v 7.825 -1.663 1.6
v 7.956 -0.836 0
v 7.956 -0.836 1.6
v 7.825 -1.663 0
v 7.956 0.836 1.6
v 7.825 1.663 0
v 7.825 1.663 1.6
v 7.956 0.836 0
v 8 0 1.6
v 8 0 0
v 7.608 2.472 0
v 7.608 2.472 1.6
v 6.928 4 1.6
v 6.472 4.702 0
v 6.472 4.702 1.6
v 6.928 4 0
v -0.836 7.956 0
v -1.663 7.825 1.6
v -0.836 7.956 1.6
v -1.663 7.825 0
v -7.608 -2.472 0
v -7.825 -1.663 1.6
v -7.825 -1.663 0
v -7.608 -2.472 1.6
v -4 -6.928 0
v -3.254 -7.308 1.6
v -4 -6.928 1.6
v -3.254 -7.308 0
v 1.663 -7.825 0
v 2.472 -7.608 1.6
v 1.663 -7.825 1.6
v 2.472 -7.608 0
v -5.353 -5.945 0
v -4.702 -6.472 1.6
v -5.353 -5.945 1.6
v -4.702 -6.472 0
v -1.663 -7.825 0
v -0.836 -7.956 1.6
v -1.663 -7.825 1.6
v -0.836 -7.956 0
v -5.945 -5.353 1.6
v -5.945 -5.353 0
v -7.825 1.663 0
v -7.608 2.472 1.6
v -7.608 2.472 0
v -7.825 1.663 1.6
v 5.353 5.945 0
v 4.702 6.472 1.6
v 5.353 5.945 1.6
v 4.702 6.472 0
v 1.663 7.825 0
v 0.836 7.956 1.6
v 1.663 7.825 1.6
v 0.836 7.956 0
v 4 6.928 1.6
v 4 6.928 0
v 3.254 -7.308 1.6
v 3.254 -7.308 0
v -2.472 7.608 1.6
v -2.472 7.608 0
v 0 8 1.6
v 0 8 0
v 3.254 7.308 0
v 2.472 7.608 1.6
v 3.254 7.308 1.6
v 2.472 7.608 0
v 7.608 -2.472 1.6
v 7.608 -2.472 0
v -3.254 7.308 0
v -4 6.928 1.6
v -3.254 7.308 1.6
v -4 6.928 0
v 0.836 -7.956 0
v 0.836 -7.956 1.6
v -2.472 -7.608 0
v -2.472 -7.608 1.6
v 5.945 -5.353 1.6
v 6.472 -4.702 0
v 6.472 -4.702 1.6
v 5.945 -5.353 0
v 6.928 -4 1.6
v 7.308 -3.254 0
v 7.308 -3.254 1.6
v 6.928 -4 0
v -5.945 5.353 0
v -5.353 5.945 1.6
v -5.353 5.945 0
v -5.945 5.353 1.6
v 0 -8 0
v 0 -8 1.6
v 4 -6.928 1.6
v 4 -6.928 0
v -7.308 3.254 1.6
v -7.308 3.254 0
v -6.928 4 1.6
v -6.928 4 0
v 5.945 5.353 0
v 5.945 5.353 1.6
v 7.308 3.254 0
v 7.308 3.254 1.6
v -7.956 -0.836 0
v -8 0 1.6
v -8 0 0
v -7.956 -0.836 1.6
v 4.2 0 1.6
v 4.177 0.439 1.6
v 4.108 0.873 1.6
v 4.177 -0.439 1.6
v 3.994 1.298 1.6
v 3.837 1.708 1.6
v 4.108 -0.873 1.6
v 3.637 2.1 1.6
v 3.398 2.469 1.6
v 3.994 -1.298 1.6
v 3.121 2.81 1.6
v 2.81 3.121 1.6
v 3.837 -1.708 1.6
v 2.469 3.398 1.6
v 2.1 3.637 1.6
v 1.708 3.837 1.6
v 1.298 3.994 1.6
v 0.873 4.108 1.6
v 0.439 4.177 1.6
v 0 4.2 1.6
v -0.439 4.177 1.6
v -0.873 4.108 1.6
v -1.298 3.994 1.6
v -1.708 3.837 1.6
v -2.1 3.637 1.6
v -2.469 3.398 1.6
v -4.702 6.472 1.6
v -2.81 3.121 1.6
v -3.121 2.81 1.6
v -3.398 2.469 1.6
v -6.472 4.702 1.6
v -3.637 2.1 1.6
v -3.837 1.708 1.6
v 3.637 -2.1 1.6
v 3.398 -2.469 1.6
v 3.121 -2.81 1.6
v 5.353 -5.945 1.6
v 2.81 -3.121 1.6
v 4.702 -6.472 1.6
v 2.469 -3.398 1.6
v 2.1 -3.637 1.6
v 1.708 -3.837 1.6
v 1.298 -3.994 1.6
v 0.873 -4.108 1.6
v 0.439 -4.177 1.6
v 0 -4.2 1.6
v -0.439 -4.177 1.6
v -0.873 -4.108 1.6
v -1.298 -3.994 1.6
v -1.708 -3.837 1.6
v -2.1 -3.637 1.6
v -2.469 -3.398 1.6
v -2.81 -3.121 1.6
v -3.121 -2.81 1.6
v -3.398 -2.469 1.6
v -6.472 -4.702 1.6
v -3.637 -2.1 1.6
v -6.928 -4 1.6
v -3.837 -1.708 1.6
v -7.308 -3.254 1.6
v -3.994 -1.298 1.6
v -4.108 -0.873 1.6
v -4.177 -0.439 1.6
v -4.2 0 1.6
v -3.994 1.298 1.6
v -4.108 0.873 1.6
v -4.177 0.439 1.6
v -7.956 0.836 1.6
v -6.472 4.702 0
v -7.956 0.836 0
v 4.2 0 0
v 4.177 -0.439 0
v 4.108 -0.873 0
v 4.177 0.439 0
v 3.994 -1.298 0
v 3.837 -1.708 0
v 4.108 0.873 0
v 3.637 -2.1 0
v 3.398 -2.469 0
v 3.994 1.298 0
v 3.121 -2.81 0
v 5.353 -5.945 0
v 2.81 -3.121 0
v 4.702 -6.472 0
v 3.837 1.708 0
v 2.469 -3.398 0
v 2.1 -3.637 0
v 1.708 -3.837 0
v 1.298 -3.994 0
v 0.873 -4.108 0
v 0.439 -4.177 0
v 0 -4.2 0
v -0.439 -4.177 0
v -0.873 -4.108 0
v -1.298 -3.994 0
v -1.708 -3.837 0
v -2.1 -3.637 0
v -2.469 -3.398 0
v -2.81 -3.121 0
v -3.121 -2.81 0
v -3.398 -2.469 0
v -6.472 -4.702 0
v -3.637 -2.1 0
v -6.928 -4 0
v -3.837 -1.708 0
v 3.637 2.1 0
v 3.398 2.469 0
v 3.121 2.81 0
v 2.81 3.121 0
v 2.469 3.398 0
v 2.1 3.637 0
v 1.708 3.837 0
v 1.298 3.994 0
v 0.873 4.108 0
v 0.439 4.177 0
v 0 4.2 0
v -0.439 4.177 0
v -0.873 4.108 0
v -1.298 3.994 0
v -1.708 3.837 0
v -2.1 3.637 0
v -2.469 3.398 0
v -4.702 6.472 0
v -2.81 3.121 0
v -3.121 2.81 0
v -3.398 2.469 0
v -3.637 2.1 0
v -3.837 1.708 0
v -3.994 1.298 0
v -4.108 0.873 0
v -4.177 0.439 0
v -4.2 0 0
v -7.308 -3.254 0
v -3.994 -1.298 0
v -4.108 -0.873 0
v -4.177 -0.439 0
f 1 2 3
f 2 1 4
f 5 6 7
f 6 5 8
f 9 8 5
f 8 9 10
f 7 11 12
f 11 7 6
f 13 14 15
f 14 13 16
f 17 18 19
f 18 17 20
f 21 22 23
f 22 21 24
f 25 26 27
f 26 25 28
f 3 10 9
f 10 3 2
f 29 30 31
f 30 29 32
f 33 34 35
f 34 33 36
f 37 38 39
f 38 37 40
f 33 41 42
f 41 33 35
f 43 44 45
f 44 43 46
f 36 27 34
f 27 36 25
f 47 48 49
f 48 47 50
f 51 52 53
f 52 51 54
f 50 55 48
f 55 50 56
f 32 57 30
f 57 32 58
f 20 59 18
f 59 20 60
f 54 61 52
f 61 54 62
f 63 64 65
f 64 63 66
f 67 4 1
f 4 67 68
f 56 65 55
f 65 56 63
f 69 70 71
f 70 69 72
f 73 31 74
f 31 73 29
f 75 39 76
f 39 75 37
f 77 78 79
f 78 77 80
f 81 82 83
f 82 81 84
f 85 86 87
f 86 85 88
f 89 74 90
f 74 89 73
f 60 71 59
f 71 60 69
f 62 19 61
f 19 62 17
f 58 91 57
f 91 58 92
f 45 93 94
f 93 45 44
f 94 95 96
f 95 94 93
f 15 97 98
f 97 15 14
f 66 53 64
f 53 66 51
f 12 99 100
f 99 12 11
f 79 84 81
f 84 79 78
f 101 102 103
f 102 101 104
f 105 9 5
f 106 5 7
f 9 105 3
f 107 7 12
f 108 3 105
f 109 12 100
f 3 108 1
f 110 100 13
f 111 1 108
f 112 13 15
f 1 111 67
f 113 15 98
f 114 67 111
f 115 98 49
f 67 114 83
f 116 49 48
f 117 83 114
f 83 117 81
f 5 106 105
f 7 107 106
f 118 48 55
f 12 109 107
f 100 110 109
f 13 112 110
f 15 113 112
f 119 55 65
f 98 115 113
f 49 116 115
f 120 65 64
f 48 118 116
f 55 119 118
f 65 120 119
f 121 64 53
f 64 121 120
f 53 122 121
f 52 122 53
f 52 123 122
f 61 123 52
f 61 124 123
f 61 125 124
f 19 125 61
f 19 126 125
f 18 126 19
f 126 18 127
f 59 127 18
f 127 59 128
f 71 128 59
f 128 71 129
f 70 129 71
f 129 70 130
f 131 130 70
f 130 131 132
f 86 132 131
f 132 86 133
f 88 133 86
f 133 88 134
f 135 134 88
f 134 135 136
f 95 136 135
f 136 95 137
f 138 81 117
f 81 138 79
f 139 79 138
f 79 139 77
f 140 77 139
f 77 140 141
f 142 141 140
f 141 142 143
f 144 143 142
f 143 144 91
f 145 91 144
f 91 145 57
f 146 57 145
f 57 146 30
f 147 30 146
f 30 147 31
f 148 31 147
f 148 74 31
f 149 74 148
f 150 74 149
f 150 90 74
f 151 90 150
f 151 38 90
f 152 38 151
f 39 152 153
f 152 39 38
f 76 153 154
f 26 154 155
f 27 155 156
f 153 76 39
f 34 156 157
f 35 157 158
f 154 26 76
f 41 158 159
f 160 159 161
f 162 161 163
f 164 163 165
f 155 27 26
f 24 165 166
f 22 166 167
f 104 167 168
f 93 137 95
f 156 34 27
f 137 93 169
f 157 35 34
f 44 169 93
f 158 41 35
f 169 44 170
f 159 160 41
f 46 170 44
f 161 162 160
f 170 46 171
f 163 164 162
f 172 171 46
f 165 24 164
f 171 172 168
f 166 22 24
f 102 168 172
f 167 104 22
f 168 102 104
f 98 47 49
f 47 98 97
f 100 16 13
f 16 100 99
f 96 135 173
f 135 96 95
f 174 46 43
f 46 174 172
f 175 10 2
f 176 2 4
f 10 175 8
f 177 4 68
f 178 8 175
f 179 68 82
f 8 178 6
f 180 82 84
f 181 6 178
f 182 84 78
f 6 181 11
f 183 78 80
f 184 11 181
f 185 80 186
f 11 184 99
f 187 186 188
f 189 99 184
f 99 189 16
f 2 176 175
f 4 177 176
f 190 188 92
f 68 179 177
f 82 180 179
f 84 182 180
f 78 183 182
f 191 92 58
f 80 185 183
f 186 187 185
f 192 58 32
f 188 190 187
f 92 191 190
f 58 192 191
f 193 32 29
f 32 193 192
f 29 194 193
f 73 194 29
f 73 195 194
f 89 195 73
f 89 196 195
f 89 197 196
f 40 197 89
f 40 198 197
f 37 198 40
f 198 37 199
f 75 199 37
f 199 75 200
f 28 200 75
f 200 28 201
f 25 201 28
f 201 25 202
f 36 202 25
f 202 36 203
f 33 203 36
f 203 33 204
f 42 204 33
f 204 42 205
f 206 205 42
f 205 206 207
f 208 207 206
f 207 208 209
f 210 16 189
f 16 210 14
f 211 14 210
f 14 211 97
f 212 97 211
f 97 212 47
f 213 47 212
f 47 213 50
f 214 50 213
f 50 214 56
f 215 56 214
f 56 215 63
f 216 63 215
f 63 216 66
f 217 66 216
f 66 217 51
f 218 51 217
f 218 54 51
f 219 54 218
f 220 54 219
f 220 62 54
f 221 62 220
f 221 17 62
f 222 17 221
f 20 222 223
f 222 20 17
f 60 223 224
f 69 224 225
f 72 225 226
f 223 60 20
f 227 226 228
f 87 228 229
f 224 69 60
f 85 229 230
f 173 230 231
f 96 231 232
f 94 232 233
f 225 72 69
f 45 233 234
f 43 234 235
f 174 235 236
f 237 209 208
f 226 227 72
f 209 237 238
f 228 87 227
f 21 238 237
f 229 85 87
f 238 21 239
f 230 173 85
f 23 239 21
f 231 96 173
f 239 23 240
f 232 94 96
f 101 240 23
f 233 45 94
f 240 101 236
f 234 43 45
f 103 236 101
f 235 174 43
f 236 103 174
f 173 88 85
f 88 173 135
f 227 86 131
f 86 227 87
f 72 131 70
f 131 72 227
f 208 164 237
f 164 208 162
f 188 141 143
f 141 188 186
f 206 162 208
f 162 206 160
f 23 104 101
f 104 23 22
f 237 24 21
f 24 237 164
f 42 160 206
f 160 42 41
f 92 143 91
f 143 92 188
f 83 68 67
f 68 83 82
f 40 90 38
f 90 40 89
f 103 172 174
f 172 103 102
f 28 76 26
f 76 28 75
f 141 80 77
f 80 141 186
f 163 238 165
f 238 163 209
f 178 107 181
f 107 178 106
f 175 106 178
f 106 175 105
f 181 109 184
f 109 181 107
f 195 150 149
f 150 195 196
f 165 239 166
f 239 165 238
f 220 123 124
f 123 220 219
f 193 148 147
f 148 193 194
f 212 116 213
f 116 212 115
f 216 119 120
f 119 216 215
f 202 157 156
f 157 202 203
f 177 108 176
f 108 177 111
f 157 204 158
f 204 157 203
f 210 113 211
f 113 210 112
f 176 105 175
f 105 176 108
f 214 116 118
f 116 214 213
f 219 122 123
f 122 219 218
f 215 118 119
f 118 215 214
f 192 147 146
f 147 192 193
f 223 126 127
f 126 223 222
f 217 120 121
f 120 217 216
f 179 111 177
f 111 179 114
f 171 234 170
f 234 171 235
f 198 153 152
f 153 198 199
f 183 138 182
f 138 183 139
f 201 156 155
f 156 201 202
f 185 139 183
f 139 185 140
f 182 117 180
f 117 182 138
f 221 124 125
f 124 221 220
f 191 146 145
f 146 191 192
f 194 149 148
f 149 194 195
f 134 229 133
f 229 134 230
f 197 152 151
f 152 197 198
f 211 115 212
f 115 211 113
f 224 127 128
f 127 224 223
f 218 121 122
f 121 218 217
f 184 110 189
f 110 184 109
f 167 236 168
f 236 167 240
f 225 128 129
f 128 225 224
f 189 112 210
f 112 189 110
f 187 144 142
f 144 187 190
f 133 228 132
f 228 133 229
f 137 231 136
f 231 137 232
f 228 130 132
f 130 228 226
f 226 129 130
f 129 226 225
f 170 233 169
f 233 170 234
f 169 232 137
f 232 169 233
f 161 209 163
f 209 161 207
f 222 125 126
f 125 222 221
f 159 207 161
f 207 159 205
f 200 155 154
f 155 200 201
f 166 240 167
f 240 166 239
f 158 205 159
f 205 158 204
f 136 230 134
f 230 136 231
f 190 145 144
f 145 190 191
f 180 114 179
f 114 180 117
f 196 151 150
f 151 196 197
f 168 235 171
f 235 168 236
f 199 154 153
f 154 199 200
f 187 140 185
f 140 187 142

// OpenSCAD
// Flat metric washer.
$fn = 60;
eps = 0.02;
inner_d = 8.4;
outer_d = 16;
thickness = 1.6;
difference() {
    cylinder(d = outer_d, h = thickness);
    translate([0, 0, -eps]) cylinder(d = inner_d, h = thickness + 2 * eps);
}
